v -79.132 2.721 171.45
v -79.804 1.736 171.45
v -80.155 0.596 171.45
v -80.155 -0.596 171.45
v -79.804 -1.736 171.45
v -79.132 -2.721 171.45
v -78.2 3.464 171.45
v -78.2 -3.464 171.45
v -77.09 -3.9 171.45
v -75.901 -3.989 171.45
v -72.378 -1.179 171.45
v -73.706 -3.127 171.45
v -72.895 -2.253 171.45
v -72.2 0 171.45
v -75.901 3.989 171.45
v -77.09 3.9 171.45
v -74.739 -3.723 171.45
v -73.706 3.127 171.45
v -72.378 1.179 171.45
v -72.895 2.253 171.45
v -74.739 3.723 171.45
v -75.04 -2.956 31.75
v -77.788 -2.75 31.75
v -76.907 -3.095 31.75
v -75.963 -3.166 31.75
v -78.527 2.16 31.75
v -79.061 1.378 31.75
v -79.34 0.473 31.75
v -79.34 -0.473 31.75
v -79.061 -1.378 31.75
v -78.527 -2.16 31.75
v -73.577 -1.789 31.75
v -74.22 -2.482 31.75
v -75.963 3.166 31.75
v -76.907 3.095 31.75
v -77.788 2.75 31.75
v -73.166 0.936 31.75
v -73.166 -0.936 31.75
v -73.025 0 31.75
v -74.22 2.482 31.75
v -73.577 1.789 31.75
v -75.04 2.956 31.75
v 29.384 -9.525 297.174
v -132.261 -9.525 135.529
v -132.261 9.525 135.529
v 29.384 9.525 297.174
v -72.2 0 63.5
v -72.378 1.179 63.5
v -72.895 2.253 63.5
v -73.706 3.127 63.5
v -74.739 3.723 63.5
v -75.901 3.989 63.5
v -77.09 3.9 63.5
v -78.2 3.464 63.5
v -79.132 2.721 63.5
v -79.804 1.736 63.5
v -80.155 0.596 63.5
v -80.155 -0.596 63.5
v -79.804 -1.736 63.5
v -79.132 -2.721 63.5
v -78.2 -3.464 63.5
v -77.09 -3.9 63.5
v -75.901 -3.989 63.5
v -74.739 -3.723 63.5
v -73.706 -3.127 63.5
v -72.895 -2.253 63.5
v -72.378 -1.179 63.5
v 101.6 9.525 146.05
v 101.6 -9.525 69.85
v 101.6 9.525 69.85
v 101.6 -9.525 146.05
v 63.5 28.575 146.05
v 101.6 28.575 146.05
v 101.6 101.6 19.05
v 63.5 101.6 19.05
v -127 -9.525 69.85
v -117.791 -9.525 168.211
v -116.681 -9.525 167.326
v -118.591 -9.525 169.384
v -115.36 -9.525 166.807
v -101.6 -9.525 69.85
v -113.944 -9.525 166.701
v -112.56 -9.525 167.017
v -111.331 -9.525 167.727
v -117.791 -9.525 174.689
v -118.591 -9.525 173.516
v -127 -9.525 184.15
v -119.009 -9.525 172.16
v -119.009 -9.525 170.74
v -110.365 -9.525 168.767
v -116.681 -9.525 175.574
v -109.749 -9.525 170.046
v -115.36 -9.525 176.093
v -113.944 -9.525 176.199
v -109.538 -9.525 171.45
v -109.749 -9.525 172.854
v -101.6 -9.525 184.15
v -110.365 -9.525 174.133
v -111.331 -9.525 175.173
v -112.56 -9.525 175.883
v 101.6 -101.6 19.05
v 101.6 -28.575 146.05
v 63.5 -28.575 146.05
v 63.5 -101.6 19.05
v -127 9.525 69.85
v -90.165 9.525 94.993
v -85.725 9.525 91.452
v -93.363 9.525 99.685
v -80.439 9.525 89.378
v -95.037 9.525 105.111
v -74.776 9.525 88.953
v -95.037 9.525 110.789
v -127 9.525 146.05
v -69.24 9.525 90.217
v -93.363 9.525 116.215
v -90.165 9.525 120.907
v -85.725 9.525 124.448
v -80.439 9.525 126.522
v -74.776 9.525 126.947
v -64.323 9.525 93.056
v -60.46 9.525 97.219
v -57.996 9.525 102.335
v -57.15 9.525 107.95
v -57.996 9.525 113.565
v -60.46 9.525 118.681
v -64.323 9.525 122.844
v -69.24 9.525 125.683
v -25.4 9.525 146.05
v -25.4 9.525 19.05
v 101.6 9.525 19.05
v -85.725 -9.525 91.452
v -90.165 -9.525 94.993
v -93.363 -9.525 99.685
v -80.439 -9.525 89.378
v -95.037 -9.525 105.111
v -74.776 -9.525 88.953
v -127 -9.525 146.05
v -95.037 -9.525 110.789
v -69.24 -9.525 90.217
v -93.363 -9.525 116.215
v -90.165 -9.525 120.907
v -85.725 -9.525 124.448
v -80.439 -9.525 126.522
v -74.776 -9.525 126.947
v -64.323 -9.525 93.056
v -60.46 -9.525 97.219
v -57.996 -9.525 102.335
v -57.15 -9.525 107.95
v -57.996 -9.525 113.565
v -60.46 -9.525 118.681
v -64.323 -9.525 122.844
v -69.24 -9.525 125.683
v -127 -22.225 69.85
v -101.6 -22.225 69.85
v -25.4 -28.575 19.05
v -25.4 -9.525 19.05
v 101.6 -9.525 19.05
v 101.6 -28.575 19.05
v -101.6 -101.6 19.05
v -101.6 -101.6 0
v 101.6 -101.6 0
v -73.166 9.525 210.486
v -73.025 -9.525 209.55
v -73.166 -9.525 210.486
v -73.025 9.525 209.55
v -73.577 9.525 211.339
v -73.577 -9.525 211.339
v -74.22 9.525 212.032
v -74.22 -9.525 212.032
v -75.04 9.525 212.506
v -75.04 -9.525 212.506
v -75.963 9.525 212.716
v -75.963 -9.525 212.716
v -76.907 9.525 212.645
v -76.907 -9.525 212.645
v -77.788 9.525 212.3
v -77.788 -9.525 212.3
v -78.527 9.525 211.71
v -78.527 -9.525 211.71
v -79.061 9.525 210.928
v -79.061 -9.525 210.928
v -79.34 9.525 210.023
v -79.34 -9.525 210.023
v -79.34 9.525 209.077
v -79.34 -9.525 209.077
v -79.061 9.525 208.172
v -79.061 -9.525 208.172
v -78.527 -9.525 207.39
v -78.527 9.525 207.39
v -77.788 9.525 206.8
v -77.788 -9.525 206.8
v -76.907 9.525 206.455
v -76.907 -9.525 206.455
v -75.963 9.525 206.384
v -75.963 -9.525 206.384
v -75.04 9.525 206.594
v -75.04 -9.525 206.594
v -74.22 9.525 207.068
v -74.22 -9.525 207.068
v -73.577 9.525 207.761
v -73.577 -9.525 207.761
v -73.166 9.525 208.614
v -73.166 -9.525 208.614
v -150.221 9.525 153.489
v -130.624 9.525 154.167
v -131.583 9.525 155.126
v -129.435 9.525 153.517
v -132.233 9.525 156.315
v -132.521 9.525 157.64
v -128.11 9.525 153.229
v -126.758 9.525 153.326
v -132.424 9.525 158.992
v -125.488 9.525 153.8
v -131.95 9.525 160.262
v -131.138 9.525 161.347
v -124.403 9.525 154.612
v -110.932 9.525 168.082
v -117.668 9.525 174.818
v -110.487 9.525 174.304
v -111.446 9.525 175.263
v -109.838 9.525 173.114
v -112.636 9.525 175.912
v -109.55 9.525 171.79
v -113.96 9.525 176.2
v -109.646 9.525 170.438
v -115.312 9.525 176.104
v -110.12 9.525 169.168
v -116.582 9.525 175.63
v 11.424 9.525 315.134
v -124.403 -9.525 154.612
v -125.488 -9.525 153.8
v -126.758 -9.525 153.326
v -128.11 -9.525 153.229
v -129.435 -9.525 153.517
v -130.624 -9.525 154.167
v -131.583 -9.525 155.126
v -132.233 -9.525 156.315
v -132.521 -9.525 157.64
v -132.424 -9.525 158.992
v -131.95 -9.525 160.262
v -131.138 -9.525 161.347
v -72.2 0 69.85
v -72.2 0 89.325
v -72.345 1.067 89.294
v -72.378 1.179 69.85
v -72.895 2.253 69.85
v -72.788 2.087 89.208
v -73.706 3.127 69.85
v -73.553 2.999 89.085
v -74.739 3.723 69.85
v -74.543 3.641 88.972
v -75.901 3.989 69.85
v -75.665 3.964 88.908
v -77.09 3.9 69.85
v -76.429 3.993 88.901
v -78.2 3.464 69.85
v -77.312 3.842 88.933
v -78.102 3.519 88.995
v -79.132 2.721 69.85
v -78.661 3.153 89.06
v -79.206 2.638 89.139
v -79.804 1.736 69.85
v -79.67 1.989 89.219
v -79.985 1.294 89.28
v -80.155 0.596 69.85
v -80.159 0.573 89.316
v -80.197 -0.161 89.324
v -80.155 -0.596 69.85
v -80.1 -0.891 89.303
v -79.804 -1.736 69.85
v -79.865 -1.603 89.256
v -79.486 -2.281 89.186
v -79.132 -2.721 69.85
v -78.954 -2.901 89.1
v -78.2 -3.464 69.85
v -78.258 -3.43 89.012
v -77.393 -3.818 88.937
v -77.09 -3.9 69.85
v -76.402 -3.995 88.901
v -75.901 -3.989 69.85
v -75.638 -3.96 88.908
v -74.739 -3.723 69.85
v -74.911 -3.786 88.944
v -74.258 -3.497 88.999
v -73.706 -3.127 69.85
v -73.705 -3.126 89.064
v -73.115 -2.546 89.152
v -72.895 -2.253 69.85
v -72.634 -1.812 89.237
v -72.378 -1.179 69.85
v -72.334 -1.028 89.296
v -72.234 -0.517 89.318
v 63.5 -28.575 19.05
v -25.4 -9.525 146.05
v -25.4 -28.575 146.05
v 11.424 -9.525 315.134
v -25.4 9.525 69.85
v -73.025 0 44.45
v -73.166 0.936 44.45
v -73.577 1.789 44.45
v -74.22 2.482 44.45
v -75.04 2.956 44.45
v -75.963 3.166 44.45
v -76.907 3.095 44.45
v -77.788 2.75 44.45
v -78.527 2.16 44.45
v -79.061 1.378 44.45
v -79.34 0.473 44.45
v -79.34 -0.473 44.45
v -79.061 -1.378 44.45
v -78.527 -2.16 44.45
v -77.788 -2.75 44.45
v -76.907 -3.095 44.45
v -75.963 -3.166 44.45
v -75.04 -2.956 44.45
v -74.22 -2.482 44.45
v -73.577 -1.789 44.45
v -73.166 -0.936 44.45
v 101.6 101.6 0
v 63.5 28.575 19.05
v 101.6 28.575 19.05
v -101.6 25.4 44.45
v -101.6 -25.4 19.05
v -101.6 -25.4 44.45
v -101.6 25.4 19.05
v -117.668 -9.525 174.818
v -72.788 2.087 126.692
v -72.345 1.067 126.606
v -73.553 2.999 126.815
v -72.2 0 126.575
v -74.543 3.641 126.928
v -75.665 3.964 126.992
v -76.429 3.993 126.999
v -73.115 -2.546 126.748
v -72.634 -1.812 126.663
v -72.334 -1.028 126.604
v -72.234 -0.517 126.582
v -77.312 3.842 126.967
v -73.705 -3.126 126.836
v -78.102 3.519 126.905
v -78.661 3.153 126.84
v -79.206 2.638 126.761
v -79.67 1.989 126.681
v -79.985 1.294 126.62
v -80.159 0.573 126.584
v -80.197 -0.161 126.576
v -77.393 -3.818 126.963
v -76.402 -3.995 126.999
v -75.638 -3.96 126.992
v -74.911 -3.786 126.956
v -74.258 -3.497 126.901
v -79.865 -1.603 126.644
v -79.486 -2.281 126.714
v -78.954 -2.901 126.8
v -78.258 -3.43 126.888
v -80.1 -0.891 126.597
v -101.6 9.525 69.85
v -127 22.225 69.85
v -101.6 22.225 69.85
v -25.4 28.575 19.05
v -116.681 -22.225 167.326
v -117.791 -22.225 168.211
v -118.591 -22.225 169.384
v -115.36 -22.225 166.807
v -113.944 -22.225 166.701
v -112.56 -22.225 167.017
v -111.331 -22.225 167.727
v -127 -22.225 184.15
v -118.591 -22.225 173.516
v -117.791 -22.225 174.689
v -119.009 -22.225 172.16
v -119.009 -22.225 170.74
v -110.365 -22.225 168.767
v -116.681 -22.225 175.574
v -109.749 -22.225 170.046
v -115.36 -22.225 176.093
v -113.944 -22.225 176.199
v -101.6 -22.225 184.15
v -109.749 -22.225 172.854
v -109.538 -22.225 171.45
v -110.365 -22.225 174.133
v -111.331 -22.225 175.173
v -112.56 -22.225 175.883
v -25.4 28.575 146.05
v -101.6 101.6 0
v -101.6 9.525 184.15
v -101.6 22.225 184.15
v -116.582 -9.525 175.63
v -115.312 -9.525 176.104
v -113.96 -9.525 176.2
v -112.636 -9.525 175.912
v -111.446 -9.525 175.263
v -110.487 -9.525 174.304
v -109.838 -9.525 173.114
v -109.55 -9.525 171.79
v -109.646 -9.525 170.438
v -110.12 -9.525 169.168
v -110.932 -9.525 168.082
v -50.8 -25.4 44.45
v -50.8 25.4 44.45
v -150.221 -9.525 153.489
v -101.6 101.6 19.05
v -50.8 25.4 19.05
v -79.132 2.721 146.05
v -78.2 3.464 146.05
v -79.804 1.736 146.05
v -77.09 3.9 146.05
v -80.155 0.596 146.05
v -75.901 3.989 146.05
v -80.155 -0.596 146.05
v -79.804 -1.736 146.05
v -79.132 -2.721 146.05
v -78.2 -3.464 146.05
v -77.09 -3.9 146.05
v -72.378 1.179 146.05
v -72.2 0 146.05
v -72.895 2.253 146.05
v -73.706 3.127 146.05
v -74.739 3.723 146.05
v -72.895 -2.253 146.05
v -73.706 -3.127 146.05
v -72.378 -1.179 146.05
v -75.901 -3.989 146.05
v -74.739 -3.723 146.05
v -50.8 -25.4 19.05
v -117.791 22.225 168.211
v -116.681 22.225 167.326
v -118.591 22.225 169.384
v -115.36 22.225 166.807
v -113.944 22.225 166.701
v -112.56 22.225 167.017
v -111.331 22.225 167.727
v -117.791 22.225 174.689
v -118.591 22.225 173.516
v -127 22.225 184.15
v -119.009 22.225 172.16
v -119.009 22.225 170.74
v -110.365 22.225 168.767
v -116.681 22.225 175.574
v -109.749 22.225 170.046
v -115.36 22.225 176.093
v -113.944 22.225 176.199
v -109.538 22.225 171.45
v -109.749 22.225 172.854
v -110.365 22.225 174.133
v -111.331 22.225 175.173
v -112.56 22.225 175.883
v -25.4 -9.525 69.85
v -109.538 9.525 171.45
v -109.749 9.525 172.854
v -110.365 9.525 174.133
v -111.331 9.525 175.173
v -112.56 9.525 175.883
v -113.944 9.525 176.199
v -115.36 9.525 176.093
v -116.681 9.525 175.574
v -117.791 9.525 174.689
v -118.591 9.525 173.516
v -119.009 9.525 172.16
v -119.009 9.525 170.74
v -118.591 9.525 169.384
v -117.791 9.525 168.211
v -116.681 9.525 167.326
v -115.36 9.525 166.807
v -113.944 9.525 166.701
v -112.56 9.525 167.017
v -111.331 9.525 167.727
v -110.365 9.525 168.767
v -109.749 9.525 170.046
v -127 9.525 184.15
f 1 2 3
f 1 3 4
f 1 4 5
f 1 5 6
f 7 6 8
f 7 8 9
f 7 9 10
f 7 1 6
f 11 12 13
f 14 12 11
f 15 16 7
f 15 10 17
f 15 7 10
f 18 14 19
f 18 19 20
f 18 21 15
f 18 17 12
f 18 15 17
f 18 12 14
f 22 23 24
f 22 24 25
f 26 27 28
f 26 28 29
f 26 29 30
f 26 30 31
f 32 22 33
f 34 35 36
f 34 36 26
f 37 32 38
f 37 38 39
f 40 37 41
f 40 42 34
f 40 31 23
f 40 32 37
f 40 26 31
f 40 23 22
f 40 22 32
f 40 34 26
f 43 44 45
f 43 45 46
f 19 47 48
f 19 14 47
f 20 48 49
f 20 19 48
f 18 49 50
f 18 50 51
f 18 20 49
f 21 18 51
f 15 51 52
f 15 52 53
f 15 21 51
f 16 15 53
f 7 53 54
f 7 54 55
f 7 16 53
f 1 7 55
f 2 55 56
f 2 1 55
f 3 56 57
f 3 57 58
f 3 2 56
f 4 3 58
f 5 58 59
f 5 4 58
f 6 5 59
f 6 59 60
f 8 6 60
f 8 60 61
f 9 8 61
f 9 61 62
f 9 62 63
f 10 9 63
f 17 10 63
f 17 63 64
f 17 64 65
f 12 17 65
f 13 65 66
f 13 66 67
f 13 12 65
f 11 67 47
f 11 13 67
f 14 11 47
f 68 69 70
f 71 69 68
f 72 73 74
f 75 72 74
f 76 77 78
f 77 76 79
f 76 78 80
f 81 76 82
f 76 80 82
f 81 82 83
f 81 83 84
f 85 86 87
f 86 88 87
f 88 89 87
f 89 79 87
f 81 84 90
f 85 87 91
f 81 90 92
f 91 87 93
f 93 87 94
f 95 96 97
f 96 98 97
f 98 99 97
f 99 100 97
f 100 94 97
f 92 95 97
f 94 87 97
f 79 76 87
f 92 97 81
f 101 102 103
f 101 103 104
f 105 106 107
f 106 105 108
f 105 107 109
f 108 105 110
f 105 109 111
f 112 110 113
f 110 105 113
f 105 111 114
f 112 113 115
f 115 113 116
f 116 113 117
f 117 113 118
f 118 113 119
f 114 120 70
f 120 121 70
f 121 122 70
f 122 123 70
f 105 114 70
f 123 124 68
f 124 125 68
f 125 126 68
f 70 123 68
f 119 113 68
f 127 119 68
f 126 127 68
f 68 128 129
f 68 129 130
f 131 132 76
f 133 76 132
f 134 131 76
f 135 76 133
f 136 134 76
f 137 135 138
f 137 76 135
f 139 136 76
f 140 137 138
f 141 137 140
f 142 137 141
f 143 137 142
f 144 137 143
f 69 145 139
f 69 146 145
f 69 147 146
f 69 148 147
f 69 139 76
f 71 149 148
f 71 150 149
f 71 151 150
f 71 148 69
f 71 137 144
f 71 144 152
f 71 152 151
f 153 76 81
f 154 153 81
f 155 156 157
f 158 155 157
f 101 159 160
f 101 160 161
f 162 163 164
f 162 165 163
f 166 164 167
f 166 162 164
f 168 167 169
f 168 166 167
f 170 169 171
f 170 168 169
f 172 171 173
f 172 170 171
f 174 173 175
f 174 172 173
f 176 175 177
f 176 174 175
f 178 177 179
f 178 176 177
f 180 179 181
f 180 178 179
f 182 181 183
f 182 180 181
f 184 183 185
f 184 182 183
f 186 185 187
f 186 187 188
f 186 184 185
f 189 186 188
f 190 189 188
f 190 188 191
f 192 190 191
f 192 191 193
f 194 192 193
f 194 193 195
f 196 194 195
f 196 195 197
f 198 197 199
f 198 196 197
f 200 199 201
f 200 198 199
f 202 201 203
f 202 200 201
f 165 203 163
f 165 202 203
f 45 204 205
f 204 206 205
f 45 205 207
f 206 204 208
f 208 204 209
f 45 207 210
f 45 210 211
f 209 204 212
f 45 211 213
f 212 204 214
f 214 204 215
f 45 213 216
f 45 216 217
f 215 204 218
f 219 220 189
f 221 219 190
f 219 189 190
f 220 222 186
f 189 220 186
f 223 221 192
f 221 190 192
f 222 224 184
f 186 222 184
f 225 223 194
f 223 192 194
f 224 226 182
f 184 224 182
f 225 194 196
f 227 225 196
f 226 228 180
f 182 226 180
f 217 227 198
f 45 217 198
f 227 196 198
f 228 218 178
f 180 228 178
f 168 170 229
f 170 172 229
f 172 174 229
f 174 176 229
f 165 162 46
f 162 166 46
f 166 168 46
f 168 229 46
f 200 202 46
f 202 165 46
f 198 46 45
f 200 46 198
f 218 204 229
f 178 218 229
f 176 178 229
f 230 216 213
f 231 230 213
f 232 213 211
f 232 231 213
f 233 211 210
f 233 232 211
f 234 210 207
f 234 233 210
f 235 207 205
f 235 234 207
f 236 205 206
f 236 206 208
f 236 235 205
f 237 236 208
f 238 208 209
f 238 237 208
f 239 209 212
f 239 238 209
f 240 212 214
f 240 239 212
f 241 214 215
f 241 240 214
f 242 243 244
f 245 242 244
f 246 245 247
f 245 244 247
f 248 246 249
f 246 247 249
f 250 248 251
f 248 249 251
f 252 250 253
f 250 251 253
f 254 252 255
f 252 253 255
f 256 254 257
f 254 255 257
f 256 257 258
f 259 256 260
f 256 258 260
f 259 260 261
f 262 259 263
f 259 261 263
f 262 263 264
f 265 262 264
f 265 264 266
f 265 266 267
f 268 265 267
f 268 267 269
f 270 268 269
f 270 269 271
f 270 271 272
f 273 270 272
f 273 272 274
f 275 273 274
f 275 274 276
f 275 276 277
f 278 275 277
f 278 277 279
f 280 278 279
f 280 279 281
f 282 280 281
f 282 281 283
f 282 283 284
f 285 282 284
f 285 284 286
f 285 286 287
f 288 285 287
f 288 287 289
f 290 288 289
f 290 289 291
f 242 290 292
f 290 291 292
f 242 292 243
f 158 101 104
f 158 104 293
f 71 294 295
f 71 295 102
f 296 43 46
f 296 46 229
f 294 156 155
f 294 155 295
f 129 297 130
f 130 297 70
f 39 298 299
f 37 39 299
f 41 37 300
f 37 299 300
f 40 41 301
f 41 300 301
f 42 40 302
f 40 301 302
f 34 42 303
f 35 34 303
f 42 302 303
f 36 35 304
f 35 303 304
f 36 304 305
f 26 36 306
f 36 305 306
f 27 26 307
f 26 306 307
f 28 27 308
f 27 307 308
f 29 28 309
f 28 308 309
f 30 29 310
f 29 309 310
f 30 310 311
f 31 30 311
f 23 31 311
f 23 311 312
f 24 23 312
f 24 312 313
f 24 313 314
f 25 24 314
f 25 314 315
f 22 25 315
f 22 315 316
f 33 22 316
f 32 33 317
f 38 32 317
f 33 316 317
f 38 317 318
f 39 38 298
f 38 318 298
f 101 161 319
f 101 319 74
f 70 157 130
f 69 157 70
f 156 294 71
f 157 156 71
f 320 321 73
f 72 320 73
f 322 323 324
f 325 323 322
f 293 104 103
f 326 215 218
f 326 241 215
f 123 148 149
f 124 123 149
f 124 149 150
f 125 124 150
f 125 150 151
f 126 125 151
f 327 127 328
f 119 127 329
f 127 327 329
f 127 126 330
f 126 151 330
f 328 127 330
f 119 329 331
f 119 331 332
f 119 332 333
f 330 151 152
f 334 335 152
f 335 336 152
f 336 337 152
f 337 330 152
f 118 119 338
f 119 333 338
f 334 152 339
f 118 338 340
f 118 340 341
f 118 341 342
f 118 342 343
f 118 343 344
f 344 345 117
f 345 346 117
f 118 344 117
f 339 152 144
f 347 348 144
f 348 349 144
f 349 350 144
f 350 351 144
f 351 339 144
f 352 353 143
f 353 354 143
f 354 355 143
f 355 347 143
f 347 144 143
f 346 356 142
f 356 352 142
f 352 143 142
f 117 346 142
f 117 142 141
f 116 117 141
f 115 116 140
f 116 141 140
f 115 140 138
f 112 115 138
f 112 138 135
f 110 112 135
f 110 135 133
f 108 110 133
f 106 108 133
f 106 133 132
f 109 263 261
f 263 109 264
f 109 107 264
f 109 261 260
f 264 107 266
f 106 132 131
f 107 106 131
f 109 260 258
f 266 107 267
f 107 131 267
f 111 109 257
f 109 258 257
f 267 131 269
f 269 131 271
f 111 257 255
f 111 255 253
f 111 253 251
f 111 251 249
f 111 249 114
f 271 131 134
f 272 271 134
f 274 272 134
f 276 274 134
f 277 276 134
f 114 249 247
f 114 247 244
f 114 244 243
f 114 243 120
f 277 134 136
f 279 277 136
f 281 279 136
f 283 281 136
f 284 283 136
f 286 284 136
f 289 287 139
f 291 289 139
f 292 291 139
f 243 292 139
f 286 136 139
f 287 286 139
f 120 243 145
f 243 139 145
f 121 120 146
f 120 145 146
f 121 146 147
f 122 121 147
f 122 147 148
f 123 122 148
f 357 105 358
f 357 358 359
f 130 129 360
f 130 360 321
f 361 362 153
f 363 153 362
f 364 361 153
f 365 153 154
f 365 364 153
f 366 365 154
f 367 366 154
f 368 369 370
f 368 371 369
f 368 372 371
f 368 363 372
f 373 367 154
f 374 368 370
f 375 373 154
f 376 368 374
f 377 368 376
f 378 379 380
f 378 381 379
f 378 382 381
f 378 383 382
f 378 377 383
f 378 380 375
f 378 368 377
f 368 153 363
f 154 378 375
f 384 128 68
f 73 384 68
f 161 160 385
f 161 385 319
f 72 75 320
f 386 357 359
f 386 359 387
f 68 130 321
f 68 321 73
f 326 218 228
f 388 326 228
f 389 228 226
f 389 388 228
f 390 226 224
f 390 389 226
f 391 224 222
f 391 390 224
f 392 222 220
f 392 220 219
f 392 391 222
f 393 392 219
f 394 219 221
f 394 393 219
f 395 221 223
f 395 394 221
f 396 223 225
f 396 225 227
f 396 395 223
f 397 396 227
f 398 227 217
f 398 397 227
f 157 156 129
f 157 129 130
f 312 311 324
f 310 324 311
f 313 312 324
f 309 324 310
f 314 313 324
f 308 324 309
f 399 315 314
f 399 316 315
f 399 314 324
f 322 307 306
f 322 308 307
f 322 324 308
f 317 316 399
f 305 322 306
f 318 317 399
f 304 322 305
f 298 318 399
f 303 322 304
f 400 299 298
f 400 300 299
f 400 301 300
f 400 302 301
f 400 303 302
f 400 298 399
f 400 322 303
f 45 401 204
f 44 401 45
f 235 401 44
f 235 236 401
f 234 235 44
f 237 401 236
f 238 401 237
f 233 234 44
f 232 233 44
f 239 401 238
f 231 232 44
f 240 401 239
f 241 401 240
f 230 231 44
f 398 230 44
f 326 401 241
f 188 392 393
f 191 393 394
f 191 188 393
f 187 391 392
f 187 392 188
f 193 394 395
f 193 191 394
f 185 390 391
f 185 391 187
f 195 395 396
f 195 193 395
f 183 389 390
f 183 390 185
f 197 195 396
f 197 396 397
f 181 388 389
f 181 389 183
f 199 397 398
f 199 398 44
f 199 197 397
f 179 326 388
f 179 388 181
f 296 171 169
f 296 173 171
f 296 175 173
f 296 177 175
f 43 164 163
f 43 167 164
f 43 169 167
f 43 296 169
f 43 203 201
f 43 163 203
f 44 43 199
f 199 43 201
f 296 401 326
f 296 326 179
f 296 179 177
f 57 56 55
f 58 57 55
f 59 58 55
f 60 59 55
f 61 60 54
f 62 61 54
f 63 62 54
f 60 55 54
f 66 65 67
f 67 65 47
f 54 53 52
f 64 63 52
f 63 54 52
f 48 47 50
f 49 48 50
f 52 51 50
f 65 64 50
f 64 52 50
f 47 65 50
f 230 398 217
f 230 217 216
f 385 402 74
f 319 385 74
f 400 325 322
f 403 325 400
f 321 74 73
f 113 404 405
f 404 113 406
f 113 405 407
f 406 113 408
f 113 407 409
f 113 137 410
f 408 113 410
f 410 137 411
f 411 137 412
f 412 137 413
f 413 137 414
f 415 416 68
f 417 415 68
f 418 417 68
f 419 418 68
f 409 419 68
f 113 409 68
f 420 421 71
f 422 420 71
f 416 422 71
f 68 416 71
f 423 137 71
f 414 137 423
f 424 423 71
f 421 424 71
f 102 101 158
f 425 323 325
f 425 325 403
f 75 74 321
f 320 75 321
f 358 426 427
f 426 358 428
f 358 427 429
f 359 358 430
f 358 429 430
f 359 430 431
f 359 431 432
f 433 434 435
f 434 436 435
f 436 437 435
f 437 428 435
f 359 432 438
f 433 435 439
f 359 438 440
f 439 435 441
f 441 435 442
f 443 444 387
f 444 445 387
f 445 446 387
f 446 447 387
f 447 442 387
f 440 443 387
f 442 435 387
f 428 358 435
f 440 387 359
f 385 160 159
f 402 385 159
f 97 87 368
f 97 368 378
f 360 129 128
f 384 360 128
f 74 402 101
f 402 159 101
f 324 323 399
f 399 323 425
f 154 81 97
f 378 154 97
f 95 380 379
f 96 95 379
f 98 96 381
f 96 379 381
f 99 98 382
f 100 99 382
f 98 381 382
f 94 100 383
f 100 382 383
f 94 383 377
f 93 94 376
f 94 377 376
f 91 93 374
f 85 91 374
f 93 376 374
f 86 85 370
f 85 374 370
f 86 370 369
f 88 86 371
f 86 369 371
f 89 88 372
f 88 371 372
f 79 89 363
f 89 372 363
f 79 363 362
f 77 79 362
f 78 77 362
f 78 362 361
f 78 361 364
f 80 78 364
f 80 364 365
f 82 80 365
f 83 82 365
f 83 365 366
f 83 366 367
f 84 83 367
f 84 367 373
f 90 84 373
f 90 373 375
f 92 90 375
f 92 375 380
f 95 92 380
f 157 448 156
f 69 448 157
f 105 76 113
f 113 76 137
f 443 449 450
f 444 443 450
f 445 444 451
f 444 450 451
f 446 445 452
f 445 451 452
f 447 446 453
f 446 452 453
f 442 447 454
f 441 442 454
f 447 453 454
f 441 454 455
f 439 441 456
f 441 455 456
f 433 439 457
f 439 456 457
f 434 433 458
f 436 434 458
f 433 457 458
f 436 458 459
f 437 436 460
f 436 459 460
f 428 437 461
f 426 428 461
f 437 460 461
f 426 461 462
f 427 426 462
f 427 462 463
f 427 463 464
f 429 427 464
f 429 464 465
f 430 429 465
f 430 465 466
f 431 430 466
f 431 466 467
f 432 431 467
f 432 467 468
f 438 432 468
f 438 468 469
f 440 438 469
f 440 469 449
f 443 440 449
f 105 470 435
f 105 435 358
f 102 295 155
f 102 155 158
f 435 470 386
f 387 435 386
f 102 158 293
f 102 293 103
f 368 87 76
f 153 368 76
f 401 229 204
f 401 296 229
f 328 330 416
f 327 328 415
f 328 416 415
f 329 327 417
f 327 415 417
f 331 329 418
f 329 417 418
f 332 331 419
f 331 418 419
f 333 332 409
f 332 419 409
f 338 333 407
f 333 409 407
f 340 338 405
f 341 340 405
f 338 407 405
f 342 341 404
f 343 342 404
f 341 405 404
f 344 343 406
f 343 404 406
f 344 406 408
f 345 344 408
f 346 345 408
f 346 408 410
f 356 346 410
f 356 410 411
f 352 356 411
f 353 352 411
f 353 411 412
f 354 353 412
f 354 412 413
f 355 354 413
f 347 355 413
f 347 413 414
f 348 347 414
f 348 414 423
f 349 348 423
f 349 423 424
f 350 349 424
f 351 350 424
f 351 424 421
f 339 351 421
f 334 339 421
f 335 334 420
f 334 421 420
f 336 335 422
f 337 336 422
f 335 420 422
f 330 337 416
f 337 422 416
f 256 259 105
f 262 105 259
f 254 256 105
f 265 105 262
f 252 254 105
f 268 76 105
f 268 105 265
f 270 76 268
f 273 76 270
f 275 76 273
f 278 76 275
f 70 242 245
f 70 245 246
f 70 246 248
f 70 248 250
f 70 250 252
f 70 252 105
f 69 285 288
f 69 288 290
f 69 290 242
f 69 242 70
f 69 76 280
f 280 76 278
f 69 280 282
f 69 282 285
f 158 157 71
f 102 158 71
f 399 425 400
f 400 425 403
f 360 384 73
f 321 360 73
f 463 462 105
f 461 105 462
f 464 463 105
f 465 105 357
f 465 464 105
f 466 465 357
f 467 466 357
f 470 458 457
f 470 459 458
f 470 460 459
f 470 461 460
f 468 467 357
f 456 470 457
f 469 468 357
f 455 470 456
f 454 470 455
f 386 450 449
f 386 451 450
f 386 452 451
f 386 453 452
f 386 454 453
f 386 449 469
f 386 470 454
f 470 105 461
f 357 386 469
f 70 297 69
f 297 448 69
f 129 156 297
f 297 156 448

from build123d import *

# Parameters (mm, degrees)
F0_W           = 203.2
F0_H           = 19.05
F1_DEPTH       = 101.6
F2_W           = 127
F2_H           = 50.8
F3_DEPTH       = 9.525
F4_W           = 228.6
F4_H           = 76.2
F5_DEPTH       = 9.525
F6_W           = 127
F6_H           = 127
F7_DEPTH       = 19.05
F10_DEPTH      = 38.1
F12_W          = 50.8
F12_H          = 50.8
F13_DEPTH      = 25.4
F14_R          = 3.175
F15_DEPTH      = 12.7
F16_R          = 4
F17_DEPTH      = 76.2
F18_R          = 19.05
F19_DEPTH      = 111.126
F20_W          = 25.4
F20_H          = 38.1
F20_H_2        = 76.2
F21_DEPTH      = 12.7
F23_R          = 4.7625
F24_DEPTH      = 123.826
F25_R          = 3.175
F26_DEPTH      = 9.525
F27_R          = 4
F28_DEPTH      = 25.4
F28_DEPTH_BACK = 82.55


# Not quite as in the source:
# - a feature names something its author has since deleted; it is built from what else it names


with BuildPart() as f1:
    # F0 (on Front) → F1 (new body, symmetric)
    with BuildSketch(Plane.XZ):
        with Locations((0, 9.525)):
            Rectangle(F0_W, F0_H)
    extrude(amount=F1_DEPTH, both=True)


with BuildPart() as f3:
    # F2 (on Front) → F3 (new body, symmetric)
    with BuildSketch(Plane.XZ):
        with Locations((38.1, 44.45)):
            Rectangle(F2_W, F2_H)
    extrude(amount=F3_DEPTH, both=True)


with BuildPart() as f5:
    # F4 (on Front) → F5 (new body, symmetric)
    with BuildSketch(Plane.XZ):
        with Locations((-12.7, 107.95)):
            Rectangle(F4_W, F4_H)
    extrude(amount=F5_DEPTH, both=True)

    # F16 (on face) → F17 (cut, through all)
    with BuildSketch(Plane.XY.offset(146.05)):
        with Locations((-76.2, 0)):
            Circle(F16_R)
    extrude(amount=-F17_DEPTH, mode=Mode.SUBTRACT)

    # F18 (on face) → F19 (cut, through all)
    with BuildSketch(Plane.XZ.offset(9.525)):
        with Locations((-76.2, 107.95)):
            Circle(F18_R)
    extrude(amount=-F19_DEPTH, mode=Mode.SUBTRACT)


with BuildPart() as f7:
    # F6 (on face) → F7 (new body)
    with BuildSketch(Plane.XZ.offset(9.525)):
        with Locations((38.1, 82.55)):
            Rectangle(F6_W, F6_H)
    extrude(amount=F7_DEPTH)


with BuildPart() as f8_1:
    # F8: instance of F7
    add(f7.part.mirror(Plane.XZ))


with BuildPart() as f10:
    # F9 (on face) → F10 (new body)
    with BuildSketch(Plane.YZ.offset(101.6)):
        Polygon((-28.575, 19.05), (-28.575, 146.05), (-101.6, 19.05), align=None)
    extrude(amount=-F10_DEPTH)


with BuildPart() as f11_1:
    # F11: instance of F10
    add(f10.part.mirror(Plane.XZ))


with BuildPart() as f13:
    # F12 (on face) → F13 (new body)
    with BuildSketch(Plane.XY.offset(19.05)):
        with Locations((-76.2, 0)):
            Rectangle(F12_W, F12_H)
    extrude(amount=F13_DEPTH)

    # F14 (on face) → F15 (cut)
    with BuildSketch(Plane.XY.offset(44.45)):
        with Locations((-76.2, 0)):
            Circle(F14_R)
    extrude(amount=-F15_DEPTH, mode=Mode.SUBTRACT)


with BuildPart() as f21:
    # F20 (on face) → F21 (new body)
    with BuildSketch(Plane.XZ.offset(9.525)):
        with Locations((-114.3, 165.1)):
            Rectangle(F20_W, F20_H)
        with Locations((-114.3, 107.95)):
            Rectangle(F20_W, F20_H_2)
    extrude(amount=F21_DEPTH)


with BuildPart() as f22_1:
    # F22: instance of F21
    add(f21.part.mirror(Plane.XZ))


with BuildPart() as f24_tool:
    # F23 (on face) → F24 (new body, through all)
    with BuildSketch(Plane.XZ.offset(22.225)):
        with Locations((-114.3, 171.45)):
            Circle(F23_R)
    extrude(amount=-F24_DEPTH)


with BuildPart() as f21_1:
    add(f21.part)

    # F24: cut by f24_tool
    add(f24_tool.part, mode=Mode.SUBTRACT)


with BuildPart() as f22_1_1:
    add(f22_1.part)

    # F24: cut by f24_tool
    add(f24_tool.part, mode=Mode.SUBTRACT)


with BuildPart() as f26:
    # F25 (on Front) → F26 (new body, symmetric)
    with BuildSketch(Plane.XZ):
        Polygon((-150.2210244843, 153.4894877579), (-132.2605122421, 135.5289755157), (29.3840979371, 297.173585695), (11.423585695, 315.1340979371), align=None)
        with BuildLine():
            ThreePointArc((-117.6675960454, 174.8175960454), (-110.9324039546, 174.8175960454), (-110.9324039546, 168.0824039546))
            Line((-110.9324039546, 168.0824039546), (-124.4027881362, 154.612019773))
            ThreePointArc((-124.4027881362, 154.612019773), (-131.137980227, 154.612019773), (-131.137980227, 161.3472118638))
            Line((-131.137980227, 161.3472118638), (-117.6675960454, 174.8175960454))
        make_face(mode=Mode.SUBTRACT)
        with Locations((-76.2, 209.55)):
            Circle(F25_R, mode=Mode.SUBTRACT)
    extrude(amount=F26_DEPTH, both=True)


with BuildPart() as f28:
    # F27 (on face) → F28 (new body, two sides)
    with BuildSketch(Plane.XY.offset(146.05)) as f28_sk:
        with Locations((-76.2, 0)):
            Circle(F27_R)
    extrude(amount=F28_DEPTH)
    extrude(f28_sk.sketch, amount=-F28_DEPTH_BACK)


solid = Compound([f1.part, f3.part, f5.part, f7.part, f8_1.part, f10.part, f11_1.part, f13.part, f21_1.part, f22_1_1.part, f26.part, f28.part])
